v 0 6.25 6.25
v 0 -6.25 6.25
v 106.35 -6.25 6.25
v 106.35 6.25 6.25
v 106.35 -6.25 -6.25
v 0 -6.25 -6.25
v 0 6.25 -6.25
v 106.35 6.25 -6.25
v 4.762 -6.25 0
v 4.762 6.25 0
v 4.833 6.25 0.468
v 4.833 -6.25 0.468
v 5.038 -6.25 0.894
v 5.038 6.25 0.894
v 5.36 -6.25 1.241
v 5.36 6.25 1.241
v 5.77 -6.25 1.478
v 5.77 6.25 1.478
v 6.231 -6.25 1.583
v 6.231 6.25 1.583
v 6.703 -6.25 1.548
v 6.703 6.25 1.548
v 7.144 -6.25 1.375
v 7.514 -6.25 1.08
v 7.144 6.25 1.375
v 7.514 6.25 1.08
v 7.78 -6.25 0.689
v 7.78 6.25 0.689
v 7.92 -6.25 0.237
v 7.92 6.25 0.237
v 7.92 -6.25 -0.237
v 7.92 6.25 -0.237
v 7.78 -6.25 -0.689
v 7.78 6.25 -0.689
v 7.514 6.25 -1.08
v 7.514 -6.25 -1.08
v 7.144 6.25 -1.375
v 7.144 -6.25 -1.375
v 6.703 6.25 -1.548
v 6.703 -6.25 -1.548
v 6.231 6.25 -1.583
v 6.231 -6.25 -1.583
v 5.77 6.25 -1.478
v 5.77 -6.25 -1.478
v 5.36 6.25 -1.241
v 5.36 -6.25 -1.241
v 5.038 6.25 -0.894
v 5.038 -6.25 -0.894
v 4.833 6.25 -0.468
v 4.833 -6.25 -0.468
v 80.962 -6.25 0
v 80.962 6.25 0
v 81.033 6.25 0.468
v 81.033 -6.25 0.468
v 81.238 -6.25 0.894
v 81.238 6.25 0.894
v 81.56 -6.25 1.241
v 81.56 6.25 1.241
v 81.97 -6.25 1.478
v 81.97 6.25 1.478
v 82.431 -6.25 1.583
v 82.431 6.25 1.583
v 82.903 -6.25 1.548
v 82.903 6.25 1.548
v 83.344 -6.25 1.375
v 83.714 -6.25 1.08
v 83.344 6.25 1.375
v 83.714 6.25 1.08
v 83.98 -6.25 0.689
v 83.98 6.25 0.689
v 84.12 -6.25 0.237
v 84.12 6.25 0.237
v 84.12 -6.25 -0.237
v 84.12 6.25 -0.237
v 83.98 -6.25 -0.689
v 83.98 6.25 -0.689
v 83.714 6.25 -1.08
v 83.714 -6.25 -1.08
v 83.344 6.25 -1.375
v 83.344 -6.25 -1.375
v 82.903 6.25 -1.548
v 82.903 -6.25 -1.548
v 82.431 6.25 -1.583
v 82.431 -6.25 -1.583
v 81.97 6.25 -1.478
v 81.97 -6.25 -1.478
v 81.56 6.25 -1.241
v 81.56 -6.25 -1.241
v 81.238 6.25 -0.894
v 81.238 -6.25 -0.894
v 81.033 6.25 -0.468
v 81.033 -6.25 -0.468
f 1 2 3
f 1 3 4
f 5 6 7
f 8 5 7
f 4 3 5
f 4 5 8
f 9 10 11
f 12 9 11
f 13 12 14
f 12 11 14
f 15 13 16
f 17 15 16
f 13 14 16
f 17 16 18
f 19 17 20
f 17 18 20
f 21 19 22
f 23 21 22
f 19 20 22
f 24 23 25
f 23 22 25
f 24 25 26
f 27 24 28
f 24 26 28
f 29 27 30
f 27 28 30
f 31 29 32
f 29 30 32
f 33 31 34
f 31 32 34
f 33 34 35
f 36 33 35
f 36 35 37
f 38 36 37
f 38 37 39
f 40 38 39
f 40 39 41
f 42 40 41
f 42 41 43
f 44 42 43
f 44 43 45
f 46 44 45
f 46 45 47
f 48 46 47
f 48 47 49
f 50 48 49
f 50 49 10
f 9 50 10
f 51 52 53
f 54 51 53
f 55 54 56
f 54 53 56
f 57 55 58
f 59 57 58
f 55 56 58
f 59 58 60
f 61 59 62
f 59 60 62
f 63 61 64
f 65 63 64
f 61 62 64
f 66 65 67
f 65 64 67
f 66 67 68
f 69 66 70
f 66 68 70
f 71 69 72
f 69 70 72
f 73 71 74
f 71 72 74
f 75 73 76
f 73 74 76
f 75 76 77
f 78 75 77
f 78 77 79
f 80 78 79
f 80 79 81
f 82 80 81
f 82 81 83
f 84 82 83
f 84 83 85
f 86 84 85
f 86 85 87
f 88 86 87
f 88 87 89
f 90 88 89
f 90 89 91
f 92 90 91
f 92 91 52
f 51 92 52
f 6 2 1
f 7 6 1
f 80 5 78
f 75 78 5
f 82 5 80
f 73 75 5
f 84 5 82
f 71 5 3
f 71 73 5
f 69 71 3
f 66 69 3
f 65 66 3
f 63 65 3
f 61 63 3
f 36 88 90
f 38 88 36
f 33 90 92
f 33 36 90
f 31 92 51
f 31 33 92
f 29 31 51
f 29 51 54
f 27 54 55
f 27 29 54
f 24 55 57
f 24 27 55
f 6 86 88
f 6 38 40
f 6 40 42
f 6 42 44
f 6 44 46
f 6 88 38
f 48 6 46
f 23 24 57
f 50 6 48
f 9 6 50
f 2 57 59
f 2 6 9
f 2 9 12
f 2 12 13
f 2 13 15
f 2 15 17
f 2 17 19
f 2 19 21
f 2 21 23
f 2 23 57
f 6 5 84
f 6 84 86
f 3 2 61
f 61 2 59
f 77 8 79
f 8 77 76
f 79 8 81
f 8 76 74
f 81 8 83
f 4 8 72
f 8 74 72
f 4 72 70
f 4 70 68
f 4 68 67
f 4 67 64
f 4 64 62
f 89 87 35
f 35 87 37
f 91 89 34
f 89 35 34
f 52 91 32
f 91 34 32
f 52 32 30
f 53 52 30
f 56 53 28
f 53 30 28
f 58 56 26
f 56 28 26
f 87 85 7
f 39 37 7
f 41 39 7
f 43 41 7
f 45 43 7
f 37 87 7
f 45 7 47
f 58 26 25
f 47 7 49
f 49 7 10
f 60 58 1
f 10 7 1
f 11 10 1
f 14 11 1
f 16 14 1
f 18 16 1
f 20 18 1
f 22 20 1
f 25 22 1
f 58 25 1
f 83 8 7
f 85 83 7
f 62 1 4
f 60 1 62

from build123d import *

# Parameters (mm, degrees)
F0_W     = 12.5
F0_H     = 12.5
F1_DEPTH = 106.35
F3_D     = 3.175


with BuildPart() as f1:
    # F0 (on Right) → F1 (new body)
    with BuildSketch(Plane.YZ):
        Rectangle(F0_W, F0_H)
    extrude(amount=F1_DEPTH)

    # F3 (through all)
    with Locations(Plane.XZ.offset(6.25)):
        with Locations((6.35, 0), (82.55, 0)):
            Hole(F3_D / 2)


solid = f1.part
